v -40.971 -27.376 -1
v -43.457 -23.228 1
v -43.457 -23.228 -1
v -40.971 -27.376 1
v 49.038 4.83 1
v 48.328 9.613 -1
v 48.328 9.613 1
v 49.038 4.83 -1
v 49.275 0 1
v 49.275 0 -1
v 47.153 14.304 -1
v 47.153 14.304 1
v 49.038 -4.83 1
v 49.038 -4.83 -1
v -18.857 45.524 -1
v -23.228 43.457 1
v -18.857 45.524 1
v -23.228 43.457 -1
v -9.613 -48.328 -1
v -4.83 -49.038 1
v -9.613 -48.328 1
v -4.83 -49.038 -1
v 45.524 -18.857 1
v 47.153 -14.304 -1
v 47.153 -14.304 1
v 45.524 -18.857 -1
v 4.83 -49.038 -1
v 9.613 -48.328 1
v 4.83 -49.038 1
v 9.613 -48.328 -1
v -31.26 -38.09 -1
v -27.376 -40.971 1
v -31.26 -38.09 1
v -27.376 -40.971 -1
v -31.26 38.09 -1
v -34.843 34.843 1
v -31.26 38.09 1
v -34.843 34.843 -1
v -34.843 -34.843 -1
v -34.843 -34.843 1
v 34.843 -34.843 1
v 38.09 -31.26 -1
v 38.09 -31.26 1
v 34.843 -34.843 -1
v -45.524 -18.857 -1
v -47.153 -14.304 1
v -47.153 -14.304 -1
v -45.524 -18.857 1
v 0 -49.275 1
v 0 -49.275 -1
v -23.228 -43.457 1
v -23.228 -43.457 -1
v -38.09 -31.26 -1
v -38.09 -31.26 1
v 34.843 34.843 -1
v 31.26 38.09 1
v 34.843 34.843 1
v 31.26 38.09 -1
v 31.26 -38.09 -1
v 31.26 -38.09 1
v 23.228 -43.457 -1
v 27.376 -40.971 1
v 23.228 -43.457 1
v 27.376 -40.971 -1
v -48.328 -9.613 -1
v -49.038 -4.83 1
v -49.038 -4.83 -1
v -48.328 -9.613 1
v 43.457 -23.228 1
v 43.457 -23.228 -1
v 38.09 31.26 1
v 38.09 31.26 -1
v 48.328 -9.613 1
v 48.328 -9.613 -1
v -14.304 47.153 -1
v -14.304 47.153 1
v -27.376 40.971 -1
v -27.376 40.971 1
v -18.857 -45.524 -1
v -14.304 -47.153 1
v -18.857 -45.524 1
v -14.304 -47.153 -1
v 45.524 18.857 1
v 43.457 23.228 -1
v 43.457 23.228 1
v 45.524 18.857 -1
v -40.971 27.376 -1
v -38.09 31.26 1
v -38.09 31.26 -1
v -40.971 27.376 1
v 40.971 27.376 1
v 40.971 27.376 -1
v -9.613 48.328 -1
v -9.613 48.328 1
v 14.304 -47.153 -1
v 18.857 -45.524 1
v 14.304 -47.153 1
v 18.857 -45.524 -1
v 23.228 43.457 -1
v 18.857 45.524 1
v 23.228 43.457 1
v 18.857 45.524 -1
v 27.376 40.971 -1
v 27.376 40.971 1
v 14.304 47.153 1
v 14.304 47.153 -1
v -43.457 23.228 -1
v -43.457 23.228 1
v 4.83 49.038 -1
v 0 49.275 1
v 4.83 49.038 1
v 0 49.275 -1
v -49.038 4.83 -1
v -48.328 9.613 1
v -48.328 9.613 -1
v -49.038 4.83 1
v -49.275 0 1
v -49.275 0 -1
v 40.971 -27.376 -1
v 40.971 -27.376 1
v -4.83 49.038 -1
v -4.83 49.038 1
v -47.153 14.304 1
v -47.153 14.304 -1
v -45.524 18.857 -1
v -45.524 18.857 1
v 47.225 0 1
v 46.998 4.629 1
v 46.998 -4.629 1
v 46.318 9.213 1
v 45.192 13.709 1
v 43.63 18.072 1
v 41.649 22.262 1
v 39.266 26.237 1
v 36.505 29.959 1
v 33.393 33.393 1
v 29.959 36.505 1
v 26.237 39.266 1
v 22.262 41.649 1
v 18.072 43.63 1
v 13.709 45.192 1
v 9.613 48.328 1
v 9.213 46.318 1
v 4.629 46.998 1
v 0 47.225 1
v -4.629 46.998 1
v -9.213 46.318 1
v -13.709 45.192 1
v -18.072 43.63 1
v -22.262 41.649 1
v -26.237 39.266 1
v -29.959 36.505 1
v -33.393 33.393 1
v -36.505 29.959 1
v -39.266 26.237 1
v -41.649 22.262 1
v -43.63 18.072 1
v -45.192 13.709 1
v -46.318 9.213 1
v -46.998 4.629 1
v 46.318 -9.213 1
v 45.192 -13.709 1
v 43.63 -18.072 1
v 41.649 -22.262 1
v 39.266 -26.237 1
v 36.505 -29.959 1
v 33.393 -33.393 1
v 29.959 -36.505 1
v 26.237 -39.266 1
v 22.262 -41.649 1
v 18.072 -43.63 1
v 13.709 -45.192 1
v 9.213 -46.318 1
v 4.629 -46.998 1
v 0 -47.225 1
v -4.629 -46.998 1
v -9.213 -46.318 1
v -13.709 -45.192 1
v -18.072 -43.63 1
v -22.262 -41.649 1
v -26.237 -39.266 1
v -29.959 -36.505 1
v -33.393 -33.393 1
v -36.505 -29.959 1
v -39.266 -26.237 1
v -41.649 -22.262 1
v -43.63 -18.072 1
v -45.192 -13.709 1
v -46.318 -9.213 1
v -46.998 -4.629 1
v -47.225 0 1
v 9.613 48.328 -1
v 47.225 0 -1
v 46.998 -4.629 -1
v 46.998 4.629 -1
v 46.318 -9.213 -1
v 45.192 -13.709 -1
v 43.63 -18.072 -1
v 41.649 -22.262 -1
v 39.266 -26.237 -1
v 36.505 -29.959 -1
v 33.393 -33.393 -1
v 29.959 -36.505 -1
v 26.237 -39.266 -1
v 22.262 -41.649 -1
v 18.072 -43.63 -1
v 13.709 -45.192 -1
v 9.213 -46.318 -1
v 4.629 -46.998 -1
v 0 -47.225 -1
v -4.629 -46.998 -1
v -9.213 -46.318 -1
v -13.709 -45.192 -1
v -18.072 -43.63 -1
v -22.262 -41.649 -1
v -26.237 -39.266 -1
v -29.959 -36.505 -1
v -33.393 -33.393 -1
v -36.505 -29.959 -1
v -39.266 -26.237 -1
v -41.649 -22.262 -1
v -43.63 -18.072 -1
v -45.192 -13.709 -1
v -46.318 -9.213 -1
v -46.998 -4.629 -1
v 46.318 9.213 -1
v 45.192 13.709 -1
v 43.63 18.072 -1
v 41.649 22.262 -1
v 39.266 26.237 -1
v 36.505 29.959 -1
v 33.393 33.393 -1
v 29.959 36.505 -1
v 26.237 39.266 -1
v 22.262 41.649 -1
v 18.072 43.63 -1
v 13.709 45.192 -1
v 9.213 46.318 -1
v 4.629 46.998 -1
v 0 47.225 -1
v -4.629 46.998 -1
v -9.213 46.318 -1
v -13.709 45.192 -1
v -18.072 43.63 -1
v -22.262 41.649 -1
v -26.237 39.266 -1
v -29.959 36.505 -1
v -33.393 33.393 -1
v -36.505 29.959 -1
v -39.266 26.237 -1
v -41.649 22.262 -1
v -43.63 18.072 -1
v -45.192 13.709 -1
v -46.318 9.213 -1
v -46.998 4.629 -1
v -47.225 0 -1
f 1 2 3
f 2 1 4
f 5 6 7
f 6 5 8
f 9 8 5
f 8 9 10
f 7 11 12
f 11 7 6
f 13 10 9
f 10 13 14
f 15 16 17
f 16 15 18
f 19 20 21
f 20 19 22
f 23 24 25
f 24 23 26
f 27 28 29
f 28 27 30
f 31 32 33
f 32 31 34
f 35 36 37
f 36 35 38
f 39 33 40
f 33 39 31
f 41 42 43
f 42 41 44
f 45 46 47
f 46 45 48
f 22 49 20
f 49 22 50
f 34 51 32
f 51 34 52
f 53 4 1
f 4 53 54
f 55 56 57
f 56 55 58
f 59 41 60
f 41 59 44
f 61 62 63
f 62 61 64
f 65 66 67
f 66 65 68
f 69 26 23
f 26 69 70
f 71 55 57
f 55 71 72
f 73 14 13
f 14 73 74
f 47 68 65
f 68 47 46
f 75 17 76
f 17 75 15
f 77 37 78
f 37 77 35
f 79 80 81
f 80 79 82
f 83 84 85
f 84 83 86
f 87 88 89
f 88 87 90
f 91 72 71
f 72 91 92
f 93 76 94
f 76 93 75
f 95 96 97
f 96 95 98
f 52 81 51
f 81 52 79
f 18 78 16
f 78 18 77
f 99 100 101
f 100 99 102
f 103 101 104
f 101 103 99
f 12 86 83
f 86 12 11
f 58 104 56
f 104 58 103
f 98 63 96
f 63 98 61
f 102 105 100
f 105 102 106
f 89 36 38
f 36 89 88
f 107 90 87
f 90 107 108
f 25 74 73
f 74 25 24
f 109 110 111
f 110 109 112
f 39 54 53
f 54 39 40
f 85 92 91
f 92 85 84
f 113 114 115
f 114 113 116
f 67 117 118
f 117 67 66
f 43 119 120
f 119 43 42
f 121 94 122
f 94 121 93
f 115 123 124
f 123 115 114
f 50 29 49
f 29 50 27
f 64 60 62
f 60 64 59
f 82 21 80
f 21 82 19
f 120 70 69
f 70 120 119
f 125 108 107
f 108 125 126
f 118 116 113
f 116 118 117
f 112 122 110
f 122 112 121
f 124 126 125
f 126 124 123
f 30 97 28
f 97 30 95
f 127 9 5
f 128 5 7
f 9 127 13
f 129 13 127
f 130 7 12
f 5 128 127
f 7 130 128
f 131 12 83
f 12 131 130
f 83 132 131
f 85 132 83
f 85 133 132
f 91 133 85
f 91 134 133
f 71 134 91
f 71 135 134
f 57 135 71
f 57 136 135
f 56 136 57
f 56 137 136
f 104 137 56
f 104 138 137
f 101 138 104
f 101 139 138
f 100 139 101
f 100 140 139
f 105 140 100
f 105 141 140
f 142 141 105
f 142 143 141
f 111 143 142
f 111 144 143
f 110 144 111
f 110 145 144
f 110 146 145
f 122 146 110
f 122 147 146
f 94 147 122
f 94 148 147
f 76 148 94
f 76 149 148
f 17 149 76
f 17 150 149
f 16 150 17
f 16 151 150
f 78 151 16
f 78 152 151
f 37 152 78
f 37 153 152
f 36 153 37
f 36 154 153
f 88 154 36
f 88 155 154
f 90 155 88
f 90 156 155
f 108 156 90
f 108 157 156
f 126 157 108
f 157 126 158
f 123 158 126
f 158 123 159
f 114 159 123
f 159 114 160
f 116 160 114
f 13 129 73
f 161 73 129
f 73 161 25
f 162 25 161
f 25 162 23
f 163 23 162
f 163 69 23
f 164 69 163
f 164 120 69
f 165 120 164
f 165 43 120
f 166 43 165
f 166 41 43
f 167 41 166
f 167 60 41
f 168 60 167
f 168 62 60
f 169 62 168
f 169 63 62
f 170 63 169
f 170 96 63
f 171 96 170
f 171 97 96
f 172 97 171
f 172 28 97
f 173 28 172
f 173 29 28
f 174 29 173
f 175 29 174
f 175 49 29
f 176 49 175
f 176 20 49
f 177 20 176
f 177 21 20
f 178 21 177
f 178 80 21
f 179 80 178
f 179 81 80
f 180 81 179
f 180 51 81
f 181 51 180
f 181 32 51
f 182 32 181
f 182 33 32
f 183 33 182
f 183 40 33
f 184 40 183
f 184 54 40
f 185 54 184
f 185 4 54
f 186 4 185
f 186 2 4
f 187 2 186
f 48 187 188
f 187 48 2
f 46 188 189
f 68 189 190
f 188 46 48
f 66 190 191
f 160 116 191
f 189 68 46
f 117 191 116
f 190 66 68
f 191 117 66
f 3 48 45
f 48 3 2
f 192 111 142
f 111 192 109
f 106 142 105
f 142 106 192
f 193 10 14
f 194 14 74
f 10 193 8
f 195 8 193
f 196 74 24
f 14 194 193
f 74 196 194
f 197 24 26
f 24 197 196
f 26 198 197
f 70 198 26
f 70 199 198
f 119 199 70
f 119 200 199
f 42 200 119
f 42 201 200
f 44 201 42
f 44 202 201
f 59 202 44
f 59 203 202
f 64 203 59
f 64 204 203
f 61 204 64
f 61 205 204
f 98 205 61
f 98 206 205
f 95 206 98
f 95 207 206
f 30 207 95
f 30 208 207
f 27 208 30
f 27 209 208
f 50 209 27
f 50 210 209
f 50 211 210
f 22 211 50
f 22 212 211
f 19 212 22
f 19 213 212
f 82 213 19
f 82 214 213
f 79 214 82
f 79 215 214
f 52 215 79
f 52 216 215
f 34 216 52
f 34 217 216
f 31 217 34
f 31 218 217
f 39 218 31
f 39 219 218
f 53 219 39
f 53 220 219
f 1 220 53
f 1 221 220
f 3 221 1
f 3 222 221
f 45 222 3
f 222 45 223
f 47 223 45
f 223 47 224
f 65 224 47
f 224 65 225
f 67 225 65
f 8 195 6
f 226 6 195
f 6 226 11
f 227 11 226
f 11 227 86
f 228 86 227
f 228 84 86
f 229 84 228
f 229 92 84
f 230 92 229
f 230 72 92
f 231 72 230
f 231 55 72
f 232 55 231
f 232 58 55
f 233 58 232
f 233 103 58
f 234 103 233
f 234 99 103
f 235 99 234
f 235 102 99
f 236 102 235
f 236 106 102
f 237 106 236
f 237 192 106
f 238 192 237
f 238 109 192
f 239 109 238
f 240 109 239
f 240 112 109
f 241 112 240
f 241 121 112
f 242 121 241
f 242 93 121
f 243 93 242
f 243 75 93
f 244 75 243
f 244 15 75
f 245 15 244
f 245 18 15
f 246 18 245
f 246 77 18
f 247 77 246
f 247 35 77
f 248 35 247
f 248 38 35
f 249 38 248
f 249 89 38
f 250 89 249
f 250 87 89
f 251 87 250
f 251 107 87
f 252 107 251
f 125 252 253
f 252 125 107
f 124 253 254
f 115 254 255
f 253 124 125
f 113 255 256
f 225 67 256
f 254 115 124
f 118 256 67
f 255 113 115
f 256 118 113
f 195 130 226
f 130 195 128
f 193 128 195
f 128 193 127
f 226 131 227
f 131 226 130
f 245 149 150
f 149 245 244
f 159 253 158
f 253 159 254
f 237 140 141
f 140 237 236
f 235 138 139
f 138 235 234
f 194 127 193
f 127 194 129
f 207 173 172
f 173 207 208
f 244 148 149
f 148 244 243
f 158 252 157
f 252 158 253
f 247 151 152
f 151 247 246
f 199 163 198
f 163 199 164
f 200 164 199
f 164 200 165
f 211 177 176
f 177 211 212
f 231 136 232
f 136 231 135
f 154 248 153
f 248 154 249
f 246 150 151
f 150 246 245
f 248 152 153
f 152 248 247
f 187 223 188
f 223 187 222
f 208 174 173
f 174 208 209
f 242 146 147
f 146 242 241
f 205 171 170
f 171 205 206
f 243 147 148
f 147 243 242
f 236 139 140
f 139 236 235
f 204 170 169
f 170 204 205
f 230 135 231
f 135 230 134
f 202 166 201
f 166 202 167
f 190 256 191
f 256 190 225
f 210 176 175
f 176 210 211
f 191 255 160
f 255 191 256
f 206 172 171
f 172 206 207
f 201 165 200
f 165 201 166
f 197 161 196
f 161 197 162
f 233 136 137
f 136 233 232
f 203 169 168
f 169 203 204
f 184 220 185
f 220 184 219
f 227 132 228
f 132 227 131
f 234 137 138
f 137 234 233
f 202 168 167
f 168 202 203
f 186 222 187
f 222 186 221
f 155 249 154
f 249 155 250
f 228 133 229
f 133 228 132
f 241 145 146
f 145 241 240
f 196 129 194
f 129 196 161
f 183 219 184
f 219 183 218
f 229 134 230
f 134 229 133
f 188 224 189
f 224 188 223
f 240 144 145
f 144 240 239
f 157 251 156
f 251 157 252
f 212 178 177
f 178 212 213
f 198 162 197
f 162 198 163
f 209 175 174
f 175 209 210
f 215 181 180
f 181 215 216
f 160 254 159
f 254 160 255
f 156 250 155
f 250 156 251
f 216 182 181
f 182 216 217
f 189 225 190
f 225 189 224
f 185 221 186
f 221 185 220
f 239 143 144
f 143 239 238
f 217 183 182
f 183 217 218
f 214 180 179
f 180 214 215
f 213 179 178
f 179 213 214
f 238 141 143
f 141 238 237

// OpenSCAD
include <../lib/fan-mount-lib.scad>;

$fn = 64;

fan_gasket();
